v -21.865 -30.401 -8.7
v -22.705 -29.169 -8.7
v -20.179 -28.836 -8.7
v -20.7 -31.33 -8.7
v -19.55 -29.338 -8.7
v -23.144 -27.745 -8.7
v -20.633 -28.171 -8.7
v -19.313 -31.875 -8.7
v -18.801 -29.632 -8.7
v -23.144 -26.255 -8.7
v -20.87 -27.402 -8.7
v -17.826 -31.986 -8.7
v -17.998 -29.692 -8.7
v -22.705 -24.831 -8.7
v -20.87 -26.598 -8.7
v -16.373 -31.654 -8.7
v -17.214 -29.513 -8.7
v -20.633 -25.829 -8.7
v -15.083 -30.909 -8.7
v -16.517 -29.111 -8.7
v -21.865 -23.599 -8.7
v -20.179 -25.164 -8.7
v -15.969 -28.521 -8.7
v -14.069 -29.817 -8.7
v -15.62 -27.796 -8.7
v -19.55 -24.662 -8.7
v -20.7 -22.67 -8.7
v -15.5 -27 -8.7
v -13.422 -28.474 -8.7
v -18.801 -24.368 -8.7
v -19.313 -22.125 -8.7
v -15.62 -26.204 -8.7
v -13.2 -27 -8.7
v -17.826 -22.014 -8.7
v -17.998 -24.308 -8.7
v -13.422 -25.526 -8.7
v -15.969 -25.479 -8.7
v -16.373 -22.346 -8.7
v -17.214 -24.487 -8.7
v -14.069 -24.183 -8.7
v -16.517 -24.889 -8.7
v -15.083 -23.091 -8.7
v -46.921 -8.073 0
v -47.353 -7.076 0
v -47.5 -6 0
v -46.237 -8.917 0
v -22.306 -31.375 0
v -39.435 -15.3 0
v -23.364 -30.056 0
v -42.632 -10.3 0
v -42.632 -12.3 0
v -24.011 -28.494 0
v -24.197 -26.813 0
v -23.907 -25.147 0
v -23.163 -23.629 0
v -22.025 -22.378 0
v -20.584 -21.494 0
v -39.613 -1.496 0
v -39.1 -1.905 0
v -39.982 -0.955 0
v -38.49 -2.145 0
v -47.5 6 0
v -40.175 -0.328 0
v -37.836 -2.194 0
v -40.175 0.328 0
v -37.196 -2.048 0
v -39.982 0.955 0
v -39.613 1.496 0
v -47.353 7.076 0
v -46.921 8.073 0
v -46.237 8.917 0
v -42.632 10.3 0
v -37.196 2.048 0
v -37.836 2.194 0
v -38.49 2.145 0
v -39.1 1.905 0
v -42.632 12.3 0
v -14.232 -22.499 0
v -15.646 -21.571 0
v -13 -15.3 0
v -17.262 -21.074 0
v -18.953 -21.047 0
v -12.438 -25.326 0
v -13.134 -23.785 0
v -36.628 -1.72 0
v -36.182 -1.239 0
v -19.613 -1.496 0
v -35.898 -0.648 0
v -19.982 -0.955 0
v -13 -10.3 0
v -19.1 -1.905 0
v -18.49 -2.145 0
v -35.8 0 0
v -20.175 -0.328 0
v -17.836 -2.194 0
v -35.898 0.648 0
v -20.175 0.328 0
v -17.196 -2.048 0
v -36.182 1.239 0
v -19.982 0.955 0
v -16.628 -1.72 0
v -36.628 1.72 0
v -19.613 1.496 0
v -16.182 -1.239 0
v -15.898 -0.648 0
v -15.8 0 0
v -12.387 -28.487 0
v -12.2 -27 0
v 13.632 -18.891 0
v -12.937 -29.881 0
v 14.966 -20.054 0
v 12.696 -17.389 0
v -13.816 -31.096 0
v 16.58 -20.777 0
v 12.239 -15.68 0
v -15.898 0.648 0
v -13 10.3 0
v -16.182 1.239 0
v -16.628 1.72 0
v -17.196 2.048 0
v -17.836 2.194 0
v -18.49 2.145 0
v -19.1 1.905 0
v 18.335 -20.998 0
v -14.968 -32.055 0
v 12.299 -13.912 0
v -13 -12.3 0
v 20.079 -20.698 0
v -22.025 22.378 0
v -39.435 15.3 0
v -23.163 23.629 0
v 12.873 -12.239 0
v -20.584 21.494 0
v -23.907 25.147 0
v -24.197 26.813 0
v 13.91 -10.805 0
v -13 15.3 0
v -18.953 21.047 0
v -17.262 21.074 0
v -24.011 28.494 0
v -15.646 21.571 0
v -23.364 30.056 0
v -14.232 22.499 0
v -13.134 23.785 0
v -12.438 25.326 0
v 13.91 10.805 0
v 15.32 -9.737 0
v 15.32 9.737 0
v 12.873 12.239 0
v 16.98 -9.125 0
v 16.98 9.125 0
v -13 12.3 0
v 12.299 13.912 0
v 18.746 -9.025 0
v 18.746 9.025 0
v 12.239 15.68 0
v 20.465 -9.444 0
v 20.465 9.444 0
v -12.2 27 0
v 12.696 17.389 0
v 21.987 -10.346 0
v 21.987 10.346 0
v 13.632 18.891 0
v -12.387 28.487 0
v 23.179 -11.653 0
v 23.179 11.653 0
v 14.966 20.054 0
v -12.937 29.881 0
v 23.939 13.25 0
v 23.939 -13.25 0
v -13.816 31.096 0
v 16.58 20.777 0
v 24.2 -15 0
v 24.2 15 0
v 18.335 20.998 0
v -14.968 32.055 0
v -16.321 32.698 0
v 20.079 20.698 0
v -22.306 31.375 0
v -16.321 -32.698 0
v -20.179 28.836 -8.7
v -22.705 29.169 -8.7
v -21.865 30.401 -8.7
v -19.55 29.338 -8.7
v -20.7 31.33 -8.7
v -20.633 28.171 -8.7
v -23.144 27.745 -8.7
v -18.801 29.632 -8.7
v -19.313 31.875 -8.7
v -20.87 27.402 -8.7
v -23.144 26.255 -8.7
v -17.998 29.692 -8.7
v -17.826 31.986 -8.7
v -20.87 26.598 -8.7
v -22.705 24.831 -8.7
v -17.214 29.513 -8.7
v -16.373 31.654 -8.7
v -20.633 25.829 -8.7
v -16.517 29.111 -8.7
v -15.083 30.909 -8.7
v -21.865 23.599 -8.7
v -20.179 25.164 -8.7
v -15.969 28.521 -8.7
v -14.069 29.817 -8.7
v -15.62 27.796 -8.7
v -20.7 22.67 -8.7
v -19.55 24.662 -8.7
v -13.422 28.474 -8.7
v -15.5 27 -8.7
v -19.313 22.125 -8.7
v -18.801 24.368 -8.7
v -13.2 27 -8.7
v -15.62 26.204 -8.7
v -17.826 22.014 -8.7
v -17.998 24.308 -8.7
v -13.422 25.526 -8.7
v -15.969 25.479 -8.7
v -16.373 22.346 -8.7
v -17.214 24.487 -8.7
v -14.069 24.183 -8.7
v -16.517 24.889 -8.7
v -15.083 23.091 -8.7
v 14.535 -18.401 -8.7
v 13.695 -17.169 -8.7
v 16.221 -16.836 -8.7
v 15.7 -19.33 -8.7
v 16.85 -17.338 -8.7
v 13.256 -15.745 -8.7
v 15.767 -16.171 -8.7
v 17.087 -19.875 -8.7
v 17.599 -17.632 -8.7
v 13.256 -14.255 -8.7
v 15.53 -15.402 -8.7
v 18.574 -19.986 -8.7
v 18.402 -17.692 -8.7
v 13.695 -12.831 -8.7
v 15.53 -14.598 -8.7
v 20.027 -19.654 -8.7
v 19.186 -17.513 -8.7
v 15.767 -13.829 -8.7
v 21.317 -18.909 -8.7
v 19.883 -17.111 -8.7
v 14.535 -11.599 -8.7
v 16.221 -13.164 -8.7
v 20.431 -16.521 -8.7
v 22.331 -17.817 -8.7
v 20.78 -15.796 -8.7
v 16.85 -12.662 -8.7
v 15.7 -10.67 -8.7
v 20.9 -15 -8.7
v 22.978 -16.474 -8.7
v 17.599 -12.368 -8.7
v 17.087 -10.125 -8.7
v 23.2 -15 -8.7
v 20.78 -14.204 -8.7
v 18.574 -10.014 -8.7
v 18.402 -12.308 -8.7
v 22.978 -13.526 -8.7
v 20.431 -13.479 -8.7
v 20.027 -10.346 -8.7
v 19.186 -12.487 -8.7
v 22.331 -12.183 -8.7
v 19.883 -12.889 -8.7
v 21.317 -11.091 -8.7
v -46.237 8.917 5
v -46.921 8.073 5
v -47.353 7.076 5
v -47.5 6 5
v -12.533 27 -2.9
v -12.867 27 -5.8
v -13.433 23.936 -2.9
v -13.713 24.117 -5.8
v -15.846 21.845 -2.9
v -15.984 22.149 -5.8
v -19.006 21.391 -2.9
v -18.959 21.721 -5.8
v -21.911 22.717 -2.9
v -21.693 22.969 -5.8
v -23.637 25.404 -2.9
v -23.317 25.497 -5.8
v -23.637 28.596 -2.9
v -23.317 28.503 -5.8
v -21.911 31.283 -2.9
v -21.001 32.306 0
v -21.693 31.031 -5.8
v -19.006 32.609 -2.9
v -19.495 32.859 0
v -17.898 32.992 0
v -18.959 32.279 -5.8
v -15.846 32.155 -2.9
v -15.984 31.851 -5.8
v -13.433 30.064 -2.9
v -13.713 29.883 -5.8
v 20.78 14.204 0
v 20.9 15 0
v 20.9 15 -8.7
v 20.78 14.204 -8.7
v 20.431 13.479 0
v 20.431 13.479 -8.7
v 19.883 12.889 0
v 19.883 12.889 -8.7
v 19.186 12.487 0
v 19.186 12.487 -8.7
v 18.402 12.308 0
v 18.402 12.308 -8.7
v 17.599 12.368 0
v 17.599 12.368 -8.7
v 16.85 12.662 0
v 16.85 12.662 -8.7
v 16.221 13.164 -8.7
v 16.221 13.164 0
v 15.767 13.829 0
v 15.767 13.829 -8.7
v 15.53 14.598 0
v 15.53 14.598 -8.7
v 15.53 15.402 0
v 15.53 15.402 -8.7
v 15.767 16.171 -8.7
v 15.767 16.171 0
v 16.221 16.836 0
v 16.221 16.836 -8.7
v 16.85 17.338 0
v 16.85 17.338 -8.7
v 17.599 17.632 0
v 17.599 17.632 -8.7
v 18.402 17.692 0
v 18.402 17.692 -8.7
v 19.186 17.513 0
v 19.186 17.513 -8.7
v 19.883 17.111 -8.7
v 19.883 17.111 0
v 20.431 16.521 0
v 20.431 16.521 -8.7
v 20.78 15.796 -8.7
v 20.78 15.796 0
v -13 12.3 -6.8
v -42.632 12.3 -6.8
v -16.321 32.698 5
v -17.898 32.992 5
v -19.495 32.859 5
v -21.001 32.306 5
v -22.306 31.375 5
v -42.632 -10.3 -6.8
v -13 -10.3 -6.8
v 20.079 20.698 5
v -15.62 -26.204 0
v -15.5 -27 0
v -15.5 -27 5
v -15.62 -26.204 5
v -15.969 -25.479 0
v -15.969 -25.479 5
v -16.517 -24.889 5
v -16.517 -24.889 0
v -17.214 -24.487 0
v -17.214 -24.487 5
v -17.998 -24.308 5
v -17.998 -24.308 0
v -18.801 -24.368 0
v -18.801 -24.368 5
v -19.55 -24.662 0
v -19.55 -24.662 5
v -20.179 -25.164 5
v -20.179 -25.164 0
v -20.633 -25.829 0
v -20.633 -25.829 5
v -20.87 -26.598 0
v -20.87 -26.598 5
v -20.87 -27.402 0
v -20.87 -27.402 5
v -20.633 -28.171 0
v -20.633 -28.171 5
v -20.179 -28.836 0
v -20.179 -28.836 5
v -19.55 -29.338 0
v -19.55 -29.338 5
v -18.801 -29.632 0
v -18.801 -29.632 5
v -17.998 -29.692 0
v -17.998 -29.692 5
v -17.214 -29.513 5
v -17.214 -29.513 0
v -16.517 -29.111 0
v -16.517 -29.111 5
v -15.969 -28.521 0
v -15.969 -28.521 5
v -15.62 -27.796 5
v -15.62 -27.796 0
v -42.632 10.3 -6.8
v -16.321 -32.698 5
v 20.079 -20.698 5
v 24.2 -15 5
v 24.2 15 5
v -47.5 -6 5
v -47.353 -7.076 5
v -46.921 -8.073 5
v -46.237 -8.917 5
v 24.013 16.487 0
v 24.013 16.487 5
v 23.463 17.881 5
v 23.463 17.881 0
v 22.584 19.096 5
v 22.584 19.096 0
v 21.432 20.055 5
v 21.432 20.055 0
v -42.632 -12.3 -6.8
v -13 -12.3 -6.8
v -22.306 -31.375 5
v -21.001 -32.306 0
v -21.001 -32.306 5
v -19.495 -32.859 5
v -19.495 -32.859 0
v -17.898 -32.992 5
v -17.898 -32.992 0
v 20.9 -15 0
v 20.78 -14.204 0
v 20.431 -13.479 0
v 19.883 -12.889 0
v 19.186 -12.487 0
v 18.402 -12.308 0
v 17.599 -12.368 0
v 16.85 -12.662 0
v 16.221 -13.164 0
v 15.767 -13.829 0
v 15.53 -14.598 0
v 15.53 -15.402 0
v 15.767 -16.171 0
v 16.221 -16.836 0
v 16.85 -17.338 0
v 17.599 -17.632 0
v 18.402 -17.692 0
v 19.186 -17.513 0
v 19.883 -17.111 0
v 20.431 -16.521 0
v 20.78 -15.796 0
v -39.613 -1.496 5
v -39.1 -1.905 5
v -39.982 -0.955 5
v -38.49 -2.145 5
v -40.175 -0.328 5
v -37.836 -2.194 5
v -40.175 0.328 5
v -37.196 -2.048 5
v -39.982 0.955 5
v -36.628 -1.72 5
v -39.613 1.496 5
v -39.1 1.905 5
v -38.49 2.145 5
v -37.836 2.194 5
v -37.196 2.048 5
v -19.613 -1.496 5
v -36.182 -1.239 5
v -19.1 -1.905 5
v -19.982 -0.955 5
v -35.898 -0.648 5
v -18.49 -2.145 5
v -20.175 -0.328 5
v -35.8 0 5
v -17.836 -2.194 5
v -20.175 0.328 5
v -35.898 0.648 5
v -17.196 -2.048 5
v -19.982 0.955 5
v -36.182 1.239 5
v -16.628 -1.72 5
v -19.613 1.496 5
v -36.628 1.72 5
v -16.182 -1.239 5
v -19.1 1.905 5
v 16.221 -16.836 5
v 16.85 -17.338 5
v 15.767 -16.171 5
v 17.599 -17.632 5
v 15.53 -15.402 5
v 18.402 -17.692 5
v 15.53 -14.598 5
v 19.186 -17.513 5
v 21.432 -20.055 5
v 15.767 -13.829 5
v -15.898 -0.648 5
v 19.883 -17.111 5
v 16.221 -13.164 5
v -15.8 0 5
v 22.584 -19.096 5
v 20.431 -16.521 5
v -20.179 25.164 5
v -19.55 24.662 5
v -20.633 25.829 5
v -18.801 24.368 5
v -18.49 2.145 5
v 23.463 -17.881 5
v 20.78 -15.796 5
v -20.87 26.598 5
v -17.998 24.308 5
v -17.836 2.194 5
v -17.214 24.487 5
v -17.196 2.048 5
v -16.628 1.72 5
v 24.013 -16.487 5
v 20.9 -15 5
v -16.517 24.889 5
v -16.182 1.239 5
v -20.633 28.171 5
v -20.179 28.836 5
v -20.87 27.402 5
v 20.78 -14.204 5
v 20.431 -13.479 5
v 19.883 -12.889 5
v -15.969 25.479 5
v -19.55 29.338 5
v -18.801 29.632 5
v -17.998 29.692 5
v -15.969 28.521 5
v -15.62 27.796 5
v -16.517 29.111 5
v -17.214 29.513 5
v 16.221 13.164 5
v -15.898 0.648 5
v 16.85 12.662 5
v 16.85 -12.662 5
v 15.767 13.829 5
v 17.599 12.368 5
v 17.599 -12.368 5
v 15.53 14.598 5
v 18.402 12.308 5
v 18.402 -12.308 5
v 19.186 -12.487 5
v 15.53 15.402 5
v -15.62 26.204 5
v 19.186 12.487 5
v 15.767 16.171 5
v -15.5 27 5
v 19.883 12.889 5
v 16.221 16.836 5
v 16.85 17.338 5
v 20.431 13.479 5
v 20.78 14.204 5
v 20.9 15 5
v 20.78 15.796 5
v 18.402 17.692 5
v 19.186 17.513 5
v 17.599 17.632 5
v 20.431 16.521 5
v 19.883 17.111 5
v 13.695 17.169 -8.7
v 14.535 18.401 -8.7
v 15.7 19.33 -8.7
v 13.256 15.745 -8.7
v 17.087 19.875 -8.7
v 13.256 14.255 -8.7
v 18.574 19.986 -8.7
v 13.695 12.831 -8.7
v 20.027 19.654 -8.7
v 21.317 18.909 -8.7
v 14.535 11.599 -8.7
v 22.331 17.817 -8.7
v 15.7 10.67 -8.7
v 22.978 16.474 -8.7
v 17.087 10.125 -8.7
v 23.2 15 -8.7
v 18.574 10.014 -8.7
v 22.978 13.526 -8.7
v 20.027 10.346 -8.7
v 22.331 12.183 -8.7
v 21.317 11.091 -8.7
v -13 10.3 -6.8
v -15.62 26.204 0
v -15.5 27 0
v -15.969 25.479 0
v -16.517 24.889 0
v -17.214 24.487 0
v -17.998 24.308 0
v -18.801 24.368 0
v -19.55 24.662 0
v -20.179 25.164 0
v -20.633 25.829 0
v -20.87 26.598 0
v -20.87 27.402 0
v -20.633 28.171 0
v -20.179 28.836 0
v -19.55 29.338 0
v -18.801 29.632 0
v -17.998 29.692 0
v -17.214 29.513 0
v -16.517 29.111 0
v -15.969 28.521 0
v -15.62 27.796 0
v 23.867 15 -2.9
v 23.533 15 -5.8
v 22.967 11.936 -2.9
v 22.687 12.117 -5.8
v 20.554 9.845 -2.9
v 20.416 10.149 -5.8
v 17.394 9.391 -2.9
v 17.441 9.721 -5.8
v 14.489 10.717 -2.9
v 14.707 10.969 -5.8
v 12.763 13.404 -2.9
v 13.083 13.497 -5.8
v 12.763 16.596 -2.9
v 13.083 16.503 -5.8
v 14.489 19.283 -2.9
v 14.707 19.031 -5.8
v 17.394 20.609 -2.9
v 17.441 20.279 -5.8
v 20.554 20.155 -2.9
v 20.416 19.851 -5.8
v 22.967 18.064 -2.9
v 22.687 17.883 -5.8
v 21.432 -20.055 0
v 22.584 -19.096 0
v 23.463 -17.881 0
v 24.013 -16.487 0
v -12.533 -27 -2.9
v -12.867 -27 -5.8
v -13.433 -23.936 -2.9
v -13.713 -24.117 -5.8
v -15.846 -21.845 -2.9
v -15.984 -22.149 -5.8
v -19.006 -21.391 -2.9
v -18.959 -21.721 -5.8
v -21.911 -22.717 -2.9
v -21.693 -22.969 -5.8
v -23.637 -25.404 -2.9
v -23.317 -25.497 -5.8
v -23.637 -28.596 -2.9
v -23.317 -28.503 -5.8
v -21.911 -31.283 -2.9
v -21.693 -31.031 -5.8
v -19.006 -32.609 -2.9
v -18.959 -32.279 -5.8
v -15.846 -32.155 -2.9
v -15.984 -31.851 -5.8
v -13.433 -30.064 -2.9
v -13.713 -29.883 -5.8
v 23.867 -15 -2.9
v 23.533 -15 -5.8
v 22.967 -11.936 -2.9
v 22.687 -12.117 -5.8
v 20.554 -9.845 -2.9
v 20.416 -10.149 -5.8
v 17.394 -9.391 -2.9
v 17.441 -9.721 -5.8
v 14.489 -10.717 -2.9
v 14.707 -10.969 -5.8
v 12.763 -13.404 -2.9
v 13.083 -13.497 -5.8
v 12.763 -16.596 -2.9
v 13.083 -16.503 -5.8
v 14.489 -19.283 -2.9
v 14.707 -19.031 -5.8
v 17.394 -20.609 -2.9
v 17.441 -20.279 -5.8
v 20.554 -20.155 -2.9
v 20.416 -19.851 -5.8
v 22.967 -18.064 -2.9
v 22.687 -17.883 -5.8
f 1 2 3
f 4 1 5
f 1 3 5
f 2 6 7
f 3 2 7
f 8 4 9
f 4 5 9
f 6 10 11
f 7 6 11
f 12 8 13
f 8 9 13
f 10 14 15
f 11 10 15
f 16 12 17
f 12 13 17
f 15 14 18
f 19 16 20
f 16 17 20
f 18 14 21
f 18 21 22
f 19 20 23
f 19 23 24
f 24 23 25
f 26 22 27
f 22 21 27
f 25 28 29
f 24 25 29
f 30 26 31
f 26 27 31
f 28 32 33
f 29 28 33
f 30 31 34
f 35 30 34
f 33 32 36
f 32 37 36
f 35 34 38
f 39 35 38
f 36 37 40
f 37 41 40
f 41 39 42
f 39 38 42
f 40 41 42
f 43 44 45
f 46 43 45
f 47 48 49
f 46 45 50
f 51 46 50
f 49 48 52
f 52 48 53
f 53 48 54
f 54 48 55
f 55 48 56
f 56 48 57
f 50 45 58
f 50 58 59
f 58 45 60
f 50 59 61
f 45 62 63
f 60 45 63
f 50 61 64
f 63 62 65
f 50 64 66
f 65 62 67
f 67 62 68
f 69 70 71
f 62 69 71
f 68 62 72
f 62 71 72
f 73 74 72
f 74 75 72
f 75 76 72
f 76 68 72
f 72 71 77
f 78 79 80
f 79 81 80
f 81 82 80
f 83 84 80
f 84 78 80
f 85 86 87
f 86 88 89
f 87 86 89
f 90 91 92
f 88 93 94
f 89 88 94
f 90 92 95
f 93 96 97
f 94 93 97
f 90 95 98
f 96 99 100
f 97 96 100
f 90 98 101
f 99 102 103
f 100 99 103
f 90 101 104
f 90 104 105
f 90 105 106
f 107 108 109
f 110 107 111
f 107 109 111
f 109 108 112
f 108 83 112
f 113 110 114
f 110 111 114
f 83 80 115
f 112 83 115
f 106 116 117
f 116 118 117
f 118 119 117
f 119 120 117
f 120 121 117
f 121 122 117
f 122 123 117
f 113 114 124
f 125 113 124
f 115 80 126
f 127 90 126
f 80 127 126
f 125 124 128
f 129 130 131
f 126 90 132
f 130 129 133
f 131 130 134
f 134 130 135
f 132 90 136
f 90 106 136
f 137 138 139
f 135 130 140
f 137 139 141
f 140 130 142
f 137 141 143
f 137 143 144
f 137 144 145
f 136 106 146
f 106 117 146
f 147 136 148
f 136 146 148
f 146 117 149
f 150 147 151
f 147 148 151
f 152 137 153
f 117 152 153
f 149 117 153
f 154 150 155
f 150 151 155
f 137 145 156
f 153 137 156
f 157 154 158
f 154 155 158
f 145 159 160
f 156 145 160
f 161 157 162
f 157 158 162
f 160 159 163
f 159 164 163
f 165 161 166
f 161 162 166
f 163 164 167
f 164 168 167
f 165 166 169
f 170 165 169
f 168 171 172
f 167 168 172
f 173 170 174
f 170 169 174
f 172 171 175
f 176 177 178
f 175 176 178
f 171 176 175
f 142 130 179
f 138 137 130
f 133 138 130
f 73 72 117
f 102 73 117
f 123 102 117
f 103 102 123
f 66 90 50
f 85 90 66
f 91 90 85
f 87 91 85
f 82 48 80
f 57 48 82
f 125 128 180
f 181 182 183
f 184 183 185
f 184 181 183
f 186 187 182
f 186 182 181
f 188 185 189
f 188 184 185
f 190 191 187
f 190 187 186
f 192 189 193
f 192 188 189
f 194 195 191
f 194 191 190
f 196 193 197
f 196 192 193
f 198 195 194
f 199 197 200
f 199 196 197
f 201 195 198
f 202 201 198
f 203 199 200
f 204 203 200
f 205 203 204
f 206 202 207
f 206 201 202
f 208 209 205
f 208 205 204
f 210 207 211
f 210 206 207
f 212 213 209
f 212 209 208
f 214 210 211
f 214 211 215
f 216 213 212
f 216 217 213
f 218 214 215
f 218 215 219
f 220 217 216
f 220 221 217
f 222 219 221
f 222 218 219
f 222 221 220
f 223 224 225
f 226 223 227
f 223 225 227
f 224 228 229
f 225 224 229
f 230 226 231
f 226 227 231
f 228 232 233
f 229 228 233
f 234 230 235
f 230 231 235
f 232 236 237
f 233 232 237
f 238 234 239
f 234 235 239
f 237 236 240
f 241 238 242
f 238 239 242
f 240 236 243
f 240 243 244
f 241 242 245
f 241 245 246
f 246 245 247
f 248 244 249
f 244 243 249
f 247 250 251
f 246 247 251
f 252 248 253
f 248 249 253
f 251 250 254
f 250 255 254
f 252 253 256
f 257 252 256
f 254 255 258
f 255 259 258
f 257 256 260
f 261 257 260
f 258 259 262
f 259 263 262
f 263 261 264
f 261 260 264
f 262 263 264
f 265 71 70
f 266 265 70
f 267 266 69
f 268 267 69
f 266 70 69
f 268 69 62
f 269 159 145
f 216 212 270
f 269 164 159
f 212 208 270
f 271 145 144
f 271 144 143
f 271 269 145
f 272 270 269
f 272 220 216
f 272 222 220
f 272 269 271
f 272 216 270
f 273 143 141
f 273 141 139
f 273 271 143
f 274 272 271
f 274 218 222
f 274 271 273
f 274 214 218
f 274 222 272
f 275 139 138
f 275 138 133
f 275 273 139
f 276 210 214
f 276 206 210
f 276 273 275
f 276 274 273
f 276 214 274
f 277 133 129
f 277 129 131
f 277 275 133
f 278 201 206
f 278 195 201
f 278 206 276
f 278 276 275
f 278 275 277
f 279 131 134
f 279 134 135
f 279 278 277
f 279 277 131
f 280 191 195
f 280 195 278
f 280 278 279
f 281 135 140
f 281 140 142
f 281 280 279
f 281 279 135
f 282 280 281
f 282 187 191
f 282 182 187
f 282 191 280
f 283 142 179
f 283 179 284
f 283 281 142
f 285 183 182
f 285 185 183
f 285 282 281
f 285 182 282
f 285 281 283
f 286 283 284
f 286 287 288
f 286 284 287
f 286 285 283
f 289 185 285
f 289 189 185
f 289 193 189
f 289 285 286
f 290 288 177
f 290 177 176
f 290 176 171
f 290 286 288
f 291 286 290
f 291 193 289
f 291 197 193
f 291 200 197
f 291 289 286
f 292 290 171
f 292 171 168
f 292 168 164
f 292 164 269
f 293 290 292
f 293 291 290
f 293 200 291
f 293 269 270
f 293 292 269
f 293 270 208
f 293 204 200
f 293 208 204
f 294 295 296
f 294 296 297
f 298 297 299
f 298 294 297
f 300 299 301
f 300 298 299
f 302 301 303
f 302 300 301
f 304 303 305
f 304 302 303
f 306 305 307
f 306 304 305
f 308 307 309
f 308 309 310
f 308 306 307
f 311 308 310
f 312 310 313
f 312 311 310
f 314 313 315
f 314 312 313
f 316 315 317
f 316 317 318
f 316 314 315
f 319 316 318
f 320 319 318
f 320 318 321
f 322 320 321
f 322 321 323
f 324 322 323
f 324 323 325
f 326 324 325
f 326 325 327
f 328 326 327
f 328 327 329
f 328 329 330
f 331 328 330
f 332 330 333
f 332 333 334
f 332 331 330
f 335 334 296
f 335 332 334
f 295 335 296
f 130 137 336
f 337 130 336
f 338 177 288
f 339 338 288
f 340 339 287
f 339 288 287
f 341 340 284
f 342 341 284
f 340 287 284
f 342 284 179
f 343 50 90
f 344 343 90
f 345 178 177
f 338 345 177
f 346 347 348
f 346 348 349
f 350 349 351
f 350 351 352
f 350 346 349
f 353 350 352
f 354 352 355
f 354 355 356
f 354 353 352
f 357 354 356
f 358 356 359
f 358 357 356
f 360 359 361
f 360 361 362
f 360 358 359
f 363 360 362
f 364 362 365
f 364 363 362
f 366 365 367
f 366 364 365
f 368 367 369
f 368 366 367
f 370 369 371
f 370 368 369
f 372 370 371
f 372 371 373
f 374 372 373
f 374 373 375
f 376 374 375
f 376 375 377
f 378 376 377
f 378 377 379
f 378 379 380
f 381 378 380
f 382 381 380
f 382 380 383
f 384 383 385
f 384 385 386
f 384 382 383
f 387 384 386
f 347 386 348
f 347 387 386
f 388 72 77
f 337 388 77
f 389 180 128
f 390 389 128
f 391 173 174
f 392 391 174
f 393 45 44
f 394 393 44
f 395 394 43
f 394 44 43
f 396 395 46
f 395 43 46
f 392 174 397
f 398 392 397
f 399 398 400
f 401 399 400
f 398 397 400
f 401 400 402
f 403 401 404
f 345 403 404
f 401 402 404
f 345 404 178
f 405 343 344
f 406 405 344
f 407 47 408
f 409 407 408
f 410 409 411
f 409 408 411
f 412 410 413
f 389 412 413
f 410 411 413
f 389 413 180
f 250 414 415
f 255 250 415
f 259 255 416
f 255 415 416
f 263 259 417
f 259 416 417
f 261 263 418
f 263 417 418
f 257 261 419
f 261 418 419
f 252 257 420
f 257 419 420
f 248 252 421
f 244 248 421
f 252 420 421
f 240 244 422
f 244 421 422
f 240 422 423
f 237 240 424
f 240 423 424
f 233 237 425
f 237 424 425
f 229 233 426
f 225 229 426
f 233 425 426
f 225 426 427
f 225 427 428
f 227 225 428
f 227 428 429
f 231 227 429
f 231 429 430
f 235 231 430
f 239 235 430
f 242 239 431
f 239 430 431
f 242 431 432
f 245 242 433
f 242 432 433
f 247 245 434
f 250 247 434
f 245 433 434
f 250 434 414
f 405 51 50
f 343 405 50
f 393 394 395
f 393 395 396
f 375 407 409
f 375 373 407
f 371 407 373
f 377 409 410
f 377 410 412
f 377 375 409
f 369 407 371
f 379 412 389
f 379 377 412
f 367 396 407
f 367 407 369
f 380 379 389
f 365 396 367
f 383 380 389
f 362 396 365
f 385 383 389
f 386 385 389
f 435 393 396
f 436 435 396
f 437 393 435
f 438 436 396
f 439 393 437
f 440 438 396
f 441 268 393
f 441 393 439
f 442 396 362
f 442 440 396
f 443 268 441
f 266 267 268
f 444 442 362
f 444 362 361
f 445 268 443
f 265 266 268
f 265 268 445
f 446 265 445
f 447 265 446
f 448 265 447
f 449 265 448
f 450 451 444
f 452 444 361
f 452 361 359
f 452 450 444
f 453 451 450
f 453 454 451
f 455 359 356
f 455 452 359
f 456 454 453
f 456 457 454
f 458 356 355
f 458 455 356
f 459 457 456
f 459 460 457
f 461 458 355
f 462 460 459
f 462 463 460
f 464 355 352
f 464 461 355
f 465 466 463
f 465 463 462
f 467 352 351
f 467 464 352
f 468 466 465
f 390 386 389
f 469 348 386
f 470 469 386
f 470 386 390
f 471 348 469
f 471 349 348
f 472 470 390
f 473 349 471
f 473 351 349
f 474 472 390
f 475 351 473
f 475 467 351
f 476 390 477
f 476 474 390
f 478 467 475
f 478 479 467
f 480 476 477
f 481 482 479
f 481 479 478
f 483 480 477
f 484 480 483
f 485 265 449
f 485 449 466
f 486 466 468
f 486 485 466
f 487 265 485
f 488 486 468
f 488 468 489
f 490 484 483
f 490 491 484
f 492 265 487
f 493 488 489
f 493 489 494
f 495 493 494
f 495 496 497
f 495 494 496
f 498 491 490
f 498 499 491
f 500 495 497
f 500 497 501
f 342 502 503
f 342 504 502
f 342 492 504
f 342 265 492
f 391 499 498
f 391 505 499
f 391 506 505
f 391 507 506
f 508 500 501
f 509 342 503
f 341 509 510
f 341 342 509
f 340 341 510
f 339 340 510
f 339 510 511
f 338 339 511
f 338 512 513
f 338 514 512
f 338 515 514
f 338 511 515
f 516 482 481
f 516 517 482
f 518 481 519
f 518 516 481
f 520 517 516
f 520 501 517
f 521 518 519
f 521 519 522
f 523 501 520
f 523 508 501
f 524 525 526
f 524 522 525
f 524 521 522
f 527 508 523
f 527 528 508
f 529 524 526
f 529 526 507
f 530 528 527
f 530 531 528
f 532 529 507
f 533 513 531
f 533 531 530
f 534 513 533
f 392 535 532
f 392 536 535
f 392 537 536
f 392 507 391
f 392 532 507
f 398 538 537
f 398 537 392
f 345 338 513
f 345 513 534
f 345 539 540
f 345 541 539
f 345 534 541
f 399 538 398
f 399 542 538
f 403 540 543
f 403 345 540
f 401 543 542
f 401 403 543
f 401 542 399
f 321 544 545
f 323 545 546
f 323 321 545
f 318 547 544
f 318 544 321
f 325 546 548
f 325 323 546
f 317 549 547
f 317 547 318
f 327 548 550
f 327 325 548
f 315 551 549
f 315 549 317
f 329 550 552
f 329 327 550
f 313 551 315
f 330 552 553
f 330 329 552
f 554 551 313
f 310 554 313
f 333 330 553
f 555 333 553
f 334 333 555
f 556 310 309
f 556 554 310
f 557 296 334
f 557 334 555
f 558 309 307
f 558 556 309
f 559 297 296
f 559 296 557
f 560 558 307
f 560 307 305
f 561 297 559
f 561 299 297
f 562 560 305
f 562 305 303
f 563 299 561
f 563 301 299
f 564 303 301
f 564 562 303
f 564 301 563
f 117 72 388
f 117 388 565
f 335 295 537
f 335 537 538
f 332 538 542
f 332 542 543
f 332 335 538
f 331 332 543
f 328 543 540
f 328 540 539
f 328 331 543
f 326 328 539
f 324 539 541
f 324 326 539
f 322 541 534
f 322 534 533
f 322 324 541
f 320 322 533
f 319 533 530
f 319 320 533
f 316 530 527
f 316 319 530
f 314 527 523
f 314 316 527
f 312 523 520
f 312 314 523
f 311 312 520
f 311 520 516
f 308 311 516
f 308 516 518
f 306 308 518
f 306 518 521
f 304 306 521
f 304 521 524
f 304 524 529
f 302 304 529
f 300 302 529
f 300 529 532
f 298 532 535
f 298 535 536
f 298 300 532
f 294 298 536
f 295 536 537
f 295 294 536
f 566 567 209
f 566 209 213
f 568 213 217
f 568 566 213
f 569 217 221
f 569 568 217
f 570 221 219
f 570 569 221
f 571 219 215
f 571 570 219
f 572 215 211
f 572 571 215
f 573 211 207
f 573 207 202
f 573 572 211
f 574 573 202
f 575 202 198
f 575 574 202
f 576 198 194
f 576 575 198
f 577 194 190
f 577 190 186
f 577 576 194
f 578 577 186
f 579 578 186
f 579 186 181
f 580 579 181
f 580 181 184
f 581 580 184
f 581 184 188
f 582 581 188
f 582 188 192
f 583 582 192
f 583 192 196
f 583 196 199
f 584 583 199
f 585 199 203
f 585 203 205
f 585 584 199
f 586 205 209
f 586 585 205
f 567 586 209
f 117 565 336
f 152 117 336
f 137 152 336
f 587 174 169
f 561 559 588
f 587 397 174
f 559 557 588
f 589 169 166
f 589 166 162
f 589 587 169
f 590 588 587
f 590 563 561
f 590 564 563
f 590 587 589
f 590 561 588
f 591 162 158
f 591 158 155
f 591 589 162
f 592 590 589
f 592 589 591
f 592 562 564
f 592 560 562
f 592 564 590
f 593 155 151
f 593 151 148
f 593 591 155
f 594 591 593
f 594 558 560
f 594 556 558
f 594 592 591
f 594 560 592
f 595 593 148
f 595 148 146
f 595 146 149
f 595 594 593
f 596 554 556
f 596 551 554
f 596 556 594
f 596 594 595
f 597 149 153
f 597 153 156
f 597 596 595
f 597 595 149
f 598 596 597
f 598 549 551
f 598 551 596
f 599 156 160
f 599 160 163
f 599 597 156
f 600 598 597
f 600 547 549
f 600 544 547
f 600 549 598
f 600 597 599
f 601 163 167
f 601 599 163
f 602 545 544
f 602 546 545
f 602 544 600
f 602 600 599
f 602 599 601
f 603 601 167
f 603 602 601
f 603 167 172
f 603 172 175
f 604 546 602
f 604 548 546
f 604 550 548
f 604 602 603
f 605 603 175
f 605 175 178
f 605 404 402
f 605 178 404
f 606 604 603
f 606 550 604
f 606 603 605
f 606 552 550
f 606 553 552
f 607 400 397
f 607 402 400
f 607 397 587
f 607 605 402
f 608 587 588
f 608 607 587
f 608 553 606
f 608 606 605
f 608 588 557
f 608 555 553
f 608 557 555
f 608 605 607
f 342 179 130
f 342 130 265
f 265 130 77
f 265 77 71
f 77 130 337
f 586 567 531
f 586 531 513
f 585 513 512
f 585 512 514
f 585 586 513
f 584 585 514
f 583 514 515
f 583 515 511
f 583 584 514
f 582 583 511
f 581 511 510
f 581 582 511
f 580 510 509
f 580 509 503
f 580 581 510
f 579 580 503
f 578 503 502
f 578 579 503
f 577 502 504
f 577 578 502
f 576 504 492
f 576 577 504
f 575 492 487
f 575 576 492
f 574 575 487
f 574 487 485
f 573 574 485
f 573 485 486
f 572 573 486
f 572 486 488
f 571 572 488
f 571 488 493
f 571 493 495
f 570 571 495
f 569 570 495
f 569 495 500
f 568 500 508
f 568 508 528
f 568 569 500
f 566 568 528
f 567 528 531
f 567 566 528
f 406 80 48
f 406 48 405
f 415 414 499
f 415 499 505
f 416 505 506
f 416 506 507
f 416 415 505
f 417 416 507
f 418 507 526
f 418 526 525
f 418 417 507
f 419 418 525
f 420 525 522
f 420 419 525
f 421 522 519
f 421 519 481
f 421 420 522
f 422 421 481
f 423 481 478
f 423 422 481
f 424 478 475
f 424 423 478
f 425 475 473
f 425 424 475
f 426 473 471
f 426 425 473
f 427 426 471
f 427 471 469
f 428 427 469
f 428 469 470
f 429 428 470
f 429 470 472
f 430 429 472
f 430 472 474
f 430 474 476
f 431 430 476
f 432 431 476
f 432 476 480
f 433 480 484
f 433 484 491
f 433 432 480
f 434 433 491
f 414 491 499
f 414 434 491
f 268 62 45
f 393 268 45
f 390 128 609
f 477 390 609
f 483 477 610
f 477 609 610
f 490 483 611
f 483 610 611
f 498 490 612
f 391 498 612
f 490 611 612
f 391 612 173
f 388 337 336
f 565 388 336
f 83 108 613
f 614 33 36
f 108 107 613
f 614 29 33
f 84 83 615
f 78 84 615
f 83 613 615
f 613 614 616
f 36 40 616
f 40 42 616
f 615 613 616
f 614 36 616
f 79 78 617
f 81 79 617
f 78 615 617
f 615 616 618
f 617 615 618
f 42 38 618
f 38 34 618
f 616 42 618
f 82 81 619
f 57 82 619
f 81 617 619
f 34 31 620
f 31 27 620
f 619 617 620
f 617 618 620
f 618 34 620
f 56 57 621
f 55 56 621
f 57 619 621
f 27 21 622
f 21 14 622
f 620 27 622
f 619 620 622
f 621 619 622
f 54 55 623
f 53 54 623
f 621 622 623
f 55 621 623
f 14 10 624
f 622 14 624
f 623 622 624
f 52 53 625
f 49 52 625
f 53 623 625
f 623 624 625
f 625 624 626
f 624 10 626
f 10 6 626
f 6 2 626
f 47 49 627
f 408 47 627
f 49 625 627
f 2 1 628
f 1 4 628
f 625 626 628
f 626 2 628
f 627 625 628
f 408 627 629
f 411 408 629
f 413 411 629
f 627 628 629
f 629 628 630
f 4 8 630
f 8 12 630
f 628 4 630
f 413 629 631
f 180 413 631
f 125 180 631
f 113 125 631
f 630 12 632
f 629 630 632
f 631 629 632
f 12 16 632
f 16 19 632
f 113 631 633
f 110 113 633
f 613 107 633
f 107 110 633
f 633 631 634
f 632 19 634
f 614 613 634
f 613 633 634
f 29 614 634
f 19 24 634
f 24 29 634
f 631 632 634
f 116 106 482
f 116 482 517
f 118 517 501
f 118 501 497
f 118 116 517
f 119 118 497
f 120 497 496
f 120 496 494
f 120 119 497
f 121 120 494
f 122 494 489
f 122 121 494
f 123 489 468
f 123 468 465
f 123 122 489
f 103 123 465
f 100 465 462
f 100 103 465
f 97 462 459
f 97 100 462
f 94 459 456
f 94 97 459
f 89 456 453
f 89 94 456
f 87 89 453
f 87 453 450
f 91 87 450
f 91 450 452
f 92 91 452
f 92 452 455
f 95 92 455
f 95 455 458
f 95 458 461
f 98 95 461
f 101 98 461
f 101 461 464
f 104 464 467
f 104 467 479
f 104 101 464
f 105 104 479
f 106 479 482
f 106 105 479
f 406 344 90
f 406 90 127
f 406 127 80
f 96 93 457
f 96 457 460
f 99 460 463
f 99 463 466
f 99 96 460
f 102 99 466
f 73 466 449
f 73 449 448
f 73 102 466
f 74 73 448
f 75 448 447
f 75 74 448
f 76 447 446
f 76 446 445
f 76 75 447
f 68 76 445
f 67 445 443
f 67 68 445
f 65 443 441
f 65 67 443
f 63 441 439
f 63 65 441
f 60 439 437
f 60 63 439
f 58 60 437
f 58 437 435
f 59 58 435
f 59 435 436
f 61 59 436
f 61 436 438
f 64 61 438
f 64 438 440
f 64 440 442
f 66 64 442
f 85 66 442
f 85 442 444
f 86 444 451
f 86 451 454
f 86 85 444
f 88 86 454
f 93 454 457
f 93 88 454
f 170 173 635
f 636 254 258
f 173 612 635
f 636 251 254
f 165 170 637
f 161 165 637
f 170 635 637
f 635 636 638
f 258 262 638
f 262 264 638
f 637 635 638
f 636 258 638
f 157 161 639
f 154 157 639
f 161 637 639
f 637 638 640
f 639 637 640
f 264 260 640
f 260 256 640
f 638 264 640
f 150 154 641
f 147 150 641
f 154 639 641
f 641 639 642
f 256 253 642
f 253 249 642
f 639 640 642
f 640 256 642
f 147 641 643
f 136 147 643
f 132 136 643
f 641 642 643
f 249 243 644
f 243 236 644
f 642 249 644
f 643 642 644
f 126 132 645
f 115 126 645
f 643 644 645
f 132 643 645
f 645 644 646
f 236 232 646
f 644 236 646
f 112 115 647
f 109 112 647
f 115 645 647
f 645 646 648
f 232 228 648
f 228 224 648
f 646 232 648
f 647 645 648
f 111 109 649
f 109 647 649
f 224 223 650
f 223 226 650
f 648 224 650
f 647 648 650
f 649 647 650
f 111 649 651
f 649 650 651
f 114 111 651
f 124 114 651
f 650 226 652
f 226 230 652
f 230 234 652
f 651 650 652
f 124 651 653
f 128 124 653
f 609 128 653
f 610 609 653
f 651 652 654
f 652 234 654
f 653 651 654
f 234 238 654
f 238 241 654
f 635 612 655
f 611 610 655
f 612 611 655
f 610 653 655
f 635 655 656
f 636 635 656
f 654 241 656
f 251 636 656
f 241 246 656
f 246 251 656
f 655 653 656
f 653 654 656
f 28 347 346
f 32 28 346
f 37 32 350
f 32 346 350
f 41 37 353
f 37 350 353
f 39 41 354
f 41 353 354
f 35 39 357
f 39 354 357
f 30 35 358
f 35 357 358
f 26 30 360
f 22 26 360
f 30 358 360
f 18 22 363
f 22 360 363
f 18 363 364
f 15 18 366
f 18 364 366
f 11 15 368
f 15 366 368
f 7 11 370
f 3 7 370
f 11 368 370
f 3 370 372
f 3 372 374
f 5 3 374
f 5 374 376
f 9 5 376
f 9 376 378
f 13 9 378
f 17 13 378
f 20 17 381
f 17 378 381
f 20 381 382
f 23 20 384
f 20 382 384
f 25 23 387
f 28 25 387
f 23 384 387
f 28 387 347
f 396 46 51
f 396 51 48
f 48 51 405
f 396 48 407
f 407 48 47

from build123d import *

# Parameters (mm, degrees)
SKETCH_1_R       = 2.7
SKETCH_1_R_2     = 2.2
EXTRUDE_1_DEPTH  = 5
SKETCH_1_4_W     = 29.632105645
SKETCH_1_4_H     = 2
EXTRUDE_2_DEPTH  = 6.8
CHAMFER_1_SIZE   = 3
CHAMFER_1_SIZE_2 = 6.8
CHAMFER_2_SIZE   = 3
CHAMFER_2_SIZE_2 = 6.8


with BuildPart() as part:
    # 草图1 → 凸台-拉伸1 (new body)
    with BuildSketch(Plane.XY):
        with BuildLine():
            Line((-22.305856328, 31.375150719), (-46.237237552, 8.916767146))
            ThreePointArc((-46.237237552, 8.916767146), (-47.170759472, 7.589190013), (-47.5, 6))
            Line((-47.5, 6), (-47.5, -6))
            ThreePointArc((-47.5, -6), (-47.170759472, -7.589190013), (-46.237237552, -8.916767146))
            Line((-46.237237552, -8.916767146), (-22.305856328, -31.375150719))
            ThreePointArc((-22.305856328, -31.375150719), (-19.495338483, -32.858506483), (-16.321429443, -32.698330691))
            Line((-16.321429443, -32.698330691), (20.078570557, -20.698330691))
            ThreePointArc((20.078570557, -20.698330691), (23.061657297, -18.516288999), (24.2, -15))
            Line((24.2, -15), (24.2, 15))
            ThreePointArc((24.2, 15), (23.061657297, 18.516288999), (20.078570557, 20.698330691))
            Line((20.078570557, 20.698330691), (-16.321429443, 32.698330691))
            ThreePointArc((-16.321429443, 32.698330691), (-19.495338483, 32.858506483), (-22.305856328, 31.375150719))
        make_face()
        with Locations((18.2, -15)):
            Circle(SKETCH_1_R, mode=Mode.SUBTRACT)
        with Locations((-38, 0)):
            Circle(SKETCH_1_R_2, mode=Mode.SUBTRACT)
        with Locations((-18, 0)):
            Circle(SKETCH_1_R_2, mode=Mode.SUBTRACT)
        with Locations((-18.2, 27)):
            Circle(SKETCH_1_R, mode=Mode.SUBTRACT)
        with Locations((18.2, 15)):
            Circle(SKETCH_1_R, mode=Mode.SUBTRACT)
        with Locations((-18.2, -27)):
            Circle(SKETCH_1_R, mode=Mode.SUBTRACT)
    extrude(amount=EXTRUDE_1_DEPTH)

    # 草图4 → 旋转1 (revolve)
    with BuildSketch(Plane(origin=(6.244417819, 18.941400719, 0), x_dir=(-0.9497217817885489, 0.3130950928973239, 0), z_dir=(-0.3130950928973239, -0.9497217817885489, 0)), mode=Mode.PRIVATE) as revolve_1_sk:
        Polygon((-6.588510035, 0), (-7.588510035, 8.7), (-9.888510035, 8.7), (-9.888510035, 0), align=None)
    revolve_1 = revolve(revolve_1_sk.sketch.rotate(Axis((18.2, 15, 4.45283877), (0, 0, -1)), 161.754145472), axis=Axis((18.2, 15, 4.45283877), (0, 0, -1)))

    # 草图4<3> → 旋转2 (revolve)
    with BuildSketch(Plane(origin=(6.244417819, 18.941400719, 0), x_dir=(-0.9497217817885489, 0.3130950928973239, 0), z_dir=(-0.3130950928973239, -0.9497217817885489, 0)), mode=Mode.PRIVATE) as revolve_2_sk:
        Polygon((30.738503937, 8.7), (28.438503937, 8.7), (28.438503937, 0), (31.738503937, 0), align=None)
    revolve_2 = revolve(revolve_2_sk.sketch.rotate(Axis((-18.2, 27, 0), (0, 0, -1)), 161.754145472), axis=Axis((-18.2, 27, 0), (0, 0, -1)))

    # 镜向1: 旋转1, 旋转2 across plane
    add(revolve_1.mirror(Plane.ZX))
    add(revolve_2.mirror(Plane.ZX))

    # 草图1<4> → 凸台-拉伸2 (add)
    with BuildSketch(Plane.XY):
        with Locations((-27.816052823, 11.3)):
            Rectangle(SKETCH_1_4_W, SKETCH_1_4_H)
        with Locations((-27.816052823, -11.3)):
            Rectangle(SKETCH_1_4_W, SKETCH_1_4_H)
    extrude(amount=-EXTRUDE_2_DEPTH)

    # 倒角1
    # the kernel refuses this chamfer: 6.8, 3 mm, written as the material it adds along each edge
    with BuildSketch(Plane(origin=(-13, 12.3, 0), x_dir=(0, 0.9968133817371192, 0.07976892872421078), z_dir=(-1, 0, 0))) as chamfer_1_piece_1_section:
        Polygon((CHAMFER_1_SIZE * 0.996813381737, CHAMFER_1_SIZE * 0.0797689287242), (-CHAMFER_1_SIZE_2 * 0.0797689287242, CHAMFER_1_SIZE_2 * 0.996813381737), (0, 0), align=None)
    chamfer_1_piece_1 = extrude(amount=29.632105645, mode=Mode.PRIVATE)
    chamfer_1_piece_1 = split(chamfer_1_piece_1, bisect_by=Plane(origin=(-34.029834246, 20.372793997, -2.314232385), z_dir=(0.6843093880009448, -0.7291917864963733, 0)), keep=Keep.TOP, mode=Mode.PRIVATE)
    chamfer_1_piece_1 = split(chamfer_1_piece_1, bisect_by=Plane(origin=(-27.32033499, 13.223232944, -6.8), z_dir=(0, 0, 1)), keep=Keep.TOP, mode=Mode.PRIVATE)
    add(chamfer_1_piece_1)

    # 倒角2
    # the kernel refuses this chamfer: 6.8, 3 mm, written as the material it adds along each edge
    with BuildSketch(Plane(origin=(-42.632105645, -12.3, 0), x_dir=(0, -0.9968133817371192, 0.07976892872421078), z_dir=(1, 0, 0))) as chamfer_2_piece_1_section:
        Polygon((CHAMFER_2_SIZE * 0.996813381737, CHAMFER_2_SIZE * 0.0797689287242), (-CHAMFER_2_SIZE_2 * 0.0797689287242, CHAMFER_2_SIZE_2 * 0.996813381737), (0, 0), align=None)
    chamfer_2_piece_1 = extrude(amount=29.632105645, mode=Mode.PRIVATE)
    chamfer_2_piece_1 = split(chamfer_2_piece_1, bisect_by=Plane(origin=(-34.029834246, -20.372793997, -2.314232385), z_dir=(0.6843093880009445, 0.7291917864963735, 0)), keep=Keep.TOP, mode=Mode.PRIVATE)
    chamfer_2_piece_1 = split(chamfer_2_piece_1, bisect_by=Plane(origin=(-27.32033499, -13.223232944, -6.8), z_dir=(0, 0, 1)), keep=Keep.TOP, mode=Mode.PRIVATE)
    add(chamfer_2_piece_1)


solid = part.part
